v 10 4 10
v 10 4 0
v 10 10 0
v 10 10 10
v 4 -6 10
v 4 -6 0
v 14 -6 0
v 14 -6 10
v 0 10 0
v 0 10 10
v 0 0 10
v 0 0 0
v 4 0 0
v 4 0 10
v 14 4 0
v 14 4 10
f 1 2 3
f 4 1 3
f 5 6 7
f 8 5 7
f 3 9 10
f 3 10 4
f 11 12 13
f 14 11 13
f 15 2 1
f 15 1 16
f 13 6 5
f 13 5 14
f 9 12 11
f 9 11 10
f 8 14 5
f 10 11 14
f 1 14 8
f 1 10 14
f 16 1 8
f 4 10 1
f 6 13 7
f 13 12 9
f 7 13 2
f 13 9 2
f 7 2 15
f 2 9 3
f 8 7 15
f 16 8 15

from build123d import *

# Parameters (mm, degrees)
BOX001_W     = 10
BOX001_H     = 10
BOX001_DEPTH = 10
BOX_W        = 10
BOX_H        = 10
BOX_DEPTH    = 10


with BuildPart() as cubo001:
    # Box001 → Box001 (new body)
    with BuildSketch(Plane(origin=(4, -6, 0), x_dir=(1, 0, 0), z_dir=(0, 0, 1))):
        with Locations((5, 5)):
            Rectangle(BOX001_W, BOX001_H)
    extrude(amount=BOX001_DEPTH)


with BuildPart() as fusion:
    # Box → Box (new body)
    with BuildSketch(Plane.XY):
        with Locations((5, 5)):
            Rectangle(BOX_W, BOX_H)
    extrude(amount=BOX_DEPTH)

    # Fusion: union Cubo001
    add(cubo001.part)


solid = fusion.part
